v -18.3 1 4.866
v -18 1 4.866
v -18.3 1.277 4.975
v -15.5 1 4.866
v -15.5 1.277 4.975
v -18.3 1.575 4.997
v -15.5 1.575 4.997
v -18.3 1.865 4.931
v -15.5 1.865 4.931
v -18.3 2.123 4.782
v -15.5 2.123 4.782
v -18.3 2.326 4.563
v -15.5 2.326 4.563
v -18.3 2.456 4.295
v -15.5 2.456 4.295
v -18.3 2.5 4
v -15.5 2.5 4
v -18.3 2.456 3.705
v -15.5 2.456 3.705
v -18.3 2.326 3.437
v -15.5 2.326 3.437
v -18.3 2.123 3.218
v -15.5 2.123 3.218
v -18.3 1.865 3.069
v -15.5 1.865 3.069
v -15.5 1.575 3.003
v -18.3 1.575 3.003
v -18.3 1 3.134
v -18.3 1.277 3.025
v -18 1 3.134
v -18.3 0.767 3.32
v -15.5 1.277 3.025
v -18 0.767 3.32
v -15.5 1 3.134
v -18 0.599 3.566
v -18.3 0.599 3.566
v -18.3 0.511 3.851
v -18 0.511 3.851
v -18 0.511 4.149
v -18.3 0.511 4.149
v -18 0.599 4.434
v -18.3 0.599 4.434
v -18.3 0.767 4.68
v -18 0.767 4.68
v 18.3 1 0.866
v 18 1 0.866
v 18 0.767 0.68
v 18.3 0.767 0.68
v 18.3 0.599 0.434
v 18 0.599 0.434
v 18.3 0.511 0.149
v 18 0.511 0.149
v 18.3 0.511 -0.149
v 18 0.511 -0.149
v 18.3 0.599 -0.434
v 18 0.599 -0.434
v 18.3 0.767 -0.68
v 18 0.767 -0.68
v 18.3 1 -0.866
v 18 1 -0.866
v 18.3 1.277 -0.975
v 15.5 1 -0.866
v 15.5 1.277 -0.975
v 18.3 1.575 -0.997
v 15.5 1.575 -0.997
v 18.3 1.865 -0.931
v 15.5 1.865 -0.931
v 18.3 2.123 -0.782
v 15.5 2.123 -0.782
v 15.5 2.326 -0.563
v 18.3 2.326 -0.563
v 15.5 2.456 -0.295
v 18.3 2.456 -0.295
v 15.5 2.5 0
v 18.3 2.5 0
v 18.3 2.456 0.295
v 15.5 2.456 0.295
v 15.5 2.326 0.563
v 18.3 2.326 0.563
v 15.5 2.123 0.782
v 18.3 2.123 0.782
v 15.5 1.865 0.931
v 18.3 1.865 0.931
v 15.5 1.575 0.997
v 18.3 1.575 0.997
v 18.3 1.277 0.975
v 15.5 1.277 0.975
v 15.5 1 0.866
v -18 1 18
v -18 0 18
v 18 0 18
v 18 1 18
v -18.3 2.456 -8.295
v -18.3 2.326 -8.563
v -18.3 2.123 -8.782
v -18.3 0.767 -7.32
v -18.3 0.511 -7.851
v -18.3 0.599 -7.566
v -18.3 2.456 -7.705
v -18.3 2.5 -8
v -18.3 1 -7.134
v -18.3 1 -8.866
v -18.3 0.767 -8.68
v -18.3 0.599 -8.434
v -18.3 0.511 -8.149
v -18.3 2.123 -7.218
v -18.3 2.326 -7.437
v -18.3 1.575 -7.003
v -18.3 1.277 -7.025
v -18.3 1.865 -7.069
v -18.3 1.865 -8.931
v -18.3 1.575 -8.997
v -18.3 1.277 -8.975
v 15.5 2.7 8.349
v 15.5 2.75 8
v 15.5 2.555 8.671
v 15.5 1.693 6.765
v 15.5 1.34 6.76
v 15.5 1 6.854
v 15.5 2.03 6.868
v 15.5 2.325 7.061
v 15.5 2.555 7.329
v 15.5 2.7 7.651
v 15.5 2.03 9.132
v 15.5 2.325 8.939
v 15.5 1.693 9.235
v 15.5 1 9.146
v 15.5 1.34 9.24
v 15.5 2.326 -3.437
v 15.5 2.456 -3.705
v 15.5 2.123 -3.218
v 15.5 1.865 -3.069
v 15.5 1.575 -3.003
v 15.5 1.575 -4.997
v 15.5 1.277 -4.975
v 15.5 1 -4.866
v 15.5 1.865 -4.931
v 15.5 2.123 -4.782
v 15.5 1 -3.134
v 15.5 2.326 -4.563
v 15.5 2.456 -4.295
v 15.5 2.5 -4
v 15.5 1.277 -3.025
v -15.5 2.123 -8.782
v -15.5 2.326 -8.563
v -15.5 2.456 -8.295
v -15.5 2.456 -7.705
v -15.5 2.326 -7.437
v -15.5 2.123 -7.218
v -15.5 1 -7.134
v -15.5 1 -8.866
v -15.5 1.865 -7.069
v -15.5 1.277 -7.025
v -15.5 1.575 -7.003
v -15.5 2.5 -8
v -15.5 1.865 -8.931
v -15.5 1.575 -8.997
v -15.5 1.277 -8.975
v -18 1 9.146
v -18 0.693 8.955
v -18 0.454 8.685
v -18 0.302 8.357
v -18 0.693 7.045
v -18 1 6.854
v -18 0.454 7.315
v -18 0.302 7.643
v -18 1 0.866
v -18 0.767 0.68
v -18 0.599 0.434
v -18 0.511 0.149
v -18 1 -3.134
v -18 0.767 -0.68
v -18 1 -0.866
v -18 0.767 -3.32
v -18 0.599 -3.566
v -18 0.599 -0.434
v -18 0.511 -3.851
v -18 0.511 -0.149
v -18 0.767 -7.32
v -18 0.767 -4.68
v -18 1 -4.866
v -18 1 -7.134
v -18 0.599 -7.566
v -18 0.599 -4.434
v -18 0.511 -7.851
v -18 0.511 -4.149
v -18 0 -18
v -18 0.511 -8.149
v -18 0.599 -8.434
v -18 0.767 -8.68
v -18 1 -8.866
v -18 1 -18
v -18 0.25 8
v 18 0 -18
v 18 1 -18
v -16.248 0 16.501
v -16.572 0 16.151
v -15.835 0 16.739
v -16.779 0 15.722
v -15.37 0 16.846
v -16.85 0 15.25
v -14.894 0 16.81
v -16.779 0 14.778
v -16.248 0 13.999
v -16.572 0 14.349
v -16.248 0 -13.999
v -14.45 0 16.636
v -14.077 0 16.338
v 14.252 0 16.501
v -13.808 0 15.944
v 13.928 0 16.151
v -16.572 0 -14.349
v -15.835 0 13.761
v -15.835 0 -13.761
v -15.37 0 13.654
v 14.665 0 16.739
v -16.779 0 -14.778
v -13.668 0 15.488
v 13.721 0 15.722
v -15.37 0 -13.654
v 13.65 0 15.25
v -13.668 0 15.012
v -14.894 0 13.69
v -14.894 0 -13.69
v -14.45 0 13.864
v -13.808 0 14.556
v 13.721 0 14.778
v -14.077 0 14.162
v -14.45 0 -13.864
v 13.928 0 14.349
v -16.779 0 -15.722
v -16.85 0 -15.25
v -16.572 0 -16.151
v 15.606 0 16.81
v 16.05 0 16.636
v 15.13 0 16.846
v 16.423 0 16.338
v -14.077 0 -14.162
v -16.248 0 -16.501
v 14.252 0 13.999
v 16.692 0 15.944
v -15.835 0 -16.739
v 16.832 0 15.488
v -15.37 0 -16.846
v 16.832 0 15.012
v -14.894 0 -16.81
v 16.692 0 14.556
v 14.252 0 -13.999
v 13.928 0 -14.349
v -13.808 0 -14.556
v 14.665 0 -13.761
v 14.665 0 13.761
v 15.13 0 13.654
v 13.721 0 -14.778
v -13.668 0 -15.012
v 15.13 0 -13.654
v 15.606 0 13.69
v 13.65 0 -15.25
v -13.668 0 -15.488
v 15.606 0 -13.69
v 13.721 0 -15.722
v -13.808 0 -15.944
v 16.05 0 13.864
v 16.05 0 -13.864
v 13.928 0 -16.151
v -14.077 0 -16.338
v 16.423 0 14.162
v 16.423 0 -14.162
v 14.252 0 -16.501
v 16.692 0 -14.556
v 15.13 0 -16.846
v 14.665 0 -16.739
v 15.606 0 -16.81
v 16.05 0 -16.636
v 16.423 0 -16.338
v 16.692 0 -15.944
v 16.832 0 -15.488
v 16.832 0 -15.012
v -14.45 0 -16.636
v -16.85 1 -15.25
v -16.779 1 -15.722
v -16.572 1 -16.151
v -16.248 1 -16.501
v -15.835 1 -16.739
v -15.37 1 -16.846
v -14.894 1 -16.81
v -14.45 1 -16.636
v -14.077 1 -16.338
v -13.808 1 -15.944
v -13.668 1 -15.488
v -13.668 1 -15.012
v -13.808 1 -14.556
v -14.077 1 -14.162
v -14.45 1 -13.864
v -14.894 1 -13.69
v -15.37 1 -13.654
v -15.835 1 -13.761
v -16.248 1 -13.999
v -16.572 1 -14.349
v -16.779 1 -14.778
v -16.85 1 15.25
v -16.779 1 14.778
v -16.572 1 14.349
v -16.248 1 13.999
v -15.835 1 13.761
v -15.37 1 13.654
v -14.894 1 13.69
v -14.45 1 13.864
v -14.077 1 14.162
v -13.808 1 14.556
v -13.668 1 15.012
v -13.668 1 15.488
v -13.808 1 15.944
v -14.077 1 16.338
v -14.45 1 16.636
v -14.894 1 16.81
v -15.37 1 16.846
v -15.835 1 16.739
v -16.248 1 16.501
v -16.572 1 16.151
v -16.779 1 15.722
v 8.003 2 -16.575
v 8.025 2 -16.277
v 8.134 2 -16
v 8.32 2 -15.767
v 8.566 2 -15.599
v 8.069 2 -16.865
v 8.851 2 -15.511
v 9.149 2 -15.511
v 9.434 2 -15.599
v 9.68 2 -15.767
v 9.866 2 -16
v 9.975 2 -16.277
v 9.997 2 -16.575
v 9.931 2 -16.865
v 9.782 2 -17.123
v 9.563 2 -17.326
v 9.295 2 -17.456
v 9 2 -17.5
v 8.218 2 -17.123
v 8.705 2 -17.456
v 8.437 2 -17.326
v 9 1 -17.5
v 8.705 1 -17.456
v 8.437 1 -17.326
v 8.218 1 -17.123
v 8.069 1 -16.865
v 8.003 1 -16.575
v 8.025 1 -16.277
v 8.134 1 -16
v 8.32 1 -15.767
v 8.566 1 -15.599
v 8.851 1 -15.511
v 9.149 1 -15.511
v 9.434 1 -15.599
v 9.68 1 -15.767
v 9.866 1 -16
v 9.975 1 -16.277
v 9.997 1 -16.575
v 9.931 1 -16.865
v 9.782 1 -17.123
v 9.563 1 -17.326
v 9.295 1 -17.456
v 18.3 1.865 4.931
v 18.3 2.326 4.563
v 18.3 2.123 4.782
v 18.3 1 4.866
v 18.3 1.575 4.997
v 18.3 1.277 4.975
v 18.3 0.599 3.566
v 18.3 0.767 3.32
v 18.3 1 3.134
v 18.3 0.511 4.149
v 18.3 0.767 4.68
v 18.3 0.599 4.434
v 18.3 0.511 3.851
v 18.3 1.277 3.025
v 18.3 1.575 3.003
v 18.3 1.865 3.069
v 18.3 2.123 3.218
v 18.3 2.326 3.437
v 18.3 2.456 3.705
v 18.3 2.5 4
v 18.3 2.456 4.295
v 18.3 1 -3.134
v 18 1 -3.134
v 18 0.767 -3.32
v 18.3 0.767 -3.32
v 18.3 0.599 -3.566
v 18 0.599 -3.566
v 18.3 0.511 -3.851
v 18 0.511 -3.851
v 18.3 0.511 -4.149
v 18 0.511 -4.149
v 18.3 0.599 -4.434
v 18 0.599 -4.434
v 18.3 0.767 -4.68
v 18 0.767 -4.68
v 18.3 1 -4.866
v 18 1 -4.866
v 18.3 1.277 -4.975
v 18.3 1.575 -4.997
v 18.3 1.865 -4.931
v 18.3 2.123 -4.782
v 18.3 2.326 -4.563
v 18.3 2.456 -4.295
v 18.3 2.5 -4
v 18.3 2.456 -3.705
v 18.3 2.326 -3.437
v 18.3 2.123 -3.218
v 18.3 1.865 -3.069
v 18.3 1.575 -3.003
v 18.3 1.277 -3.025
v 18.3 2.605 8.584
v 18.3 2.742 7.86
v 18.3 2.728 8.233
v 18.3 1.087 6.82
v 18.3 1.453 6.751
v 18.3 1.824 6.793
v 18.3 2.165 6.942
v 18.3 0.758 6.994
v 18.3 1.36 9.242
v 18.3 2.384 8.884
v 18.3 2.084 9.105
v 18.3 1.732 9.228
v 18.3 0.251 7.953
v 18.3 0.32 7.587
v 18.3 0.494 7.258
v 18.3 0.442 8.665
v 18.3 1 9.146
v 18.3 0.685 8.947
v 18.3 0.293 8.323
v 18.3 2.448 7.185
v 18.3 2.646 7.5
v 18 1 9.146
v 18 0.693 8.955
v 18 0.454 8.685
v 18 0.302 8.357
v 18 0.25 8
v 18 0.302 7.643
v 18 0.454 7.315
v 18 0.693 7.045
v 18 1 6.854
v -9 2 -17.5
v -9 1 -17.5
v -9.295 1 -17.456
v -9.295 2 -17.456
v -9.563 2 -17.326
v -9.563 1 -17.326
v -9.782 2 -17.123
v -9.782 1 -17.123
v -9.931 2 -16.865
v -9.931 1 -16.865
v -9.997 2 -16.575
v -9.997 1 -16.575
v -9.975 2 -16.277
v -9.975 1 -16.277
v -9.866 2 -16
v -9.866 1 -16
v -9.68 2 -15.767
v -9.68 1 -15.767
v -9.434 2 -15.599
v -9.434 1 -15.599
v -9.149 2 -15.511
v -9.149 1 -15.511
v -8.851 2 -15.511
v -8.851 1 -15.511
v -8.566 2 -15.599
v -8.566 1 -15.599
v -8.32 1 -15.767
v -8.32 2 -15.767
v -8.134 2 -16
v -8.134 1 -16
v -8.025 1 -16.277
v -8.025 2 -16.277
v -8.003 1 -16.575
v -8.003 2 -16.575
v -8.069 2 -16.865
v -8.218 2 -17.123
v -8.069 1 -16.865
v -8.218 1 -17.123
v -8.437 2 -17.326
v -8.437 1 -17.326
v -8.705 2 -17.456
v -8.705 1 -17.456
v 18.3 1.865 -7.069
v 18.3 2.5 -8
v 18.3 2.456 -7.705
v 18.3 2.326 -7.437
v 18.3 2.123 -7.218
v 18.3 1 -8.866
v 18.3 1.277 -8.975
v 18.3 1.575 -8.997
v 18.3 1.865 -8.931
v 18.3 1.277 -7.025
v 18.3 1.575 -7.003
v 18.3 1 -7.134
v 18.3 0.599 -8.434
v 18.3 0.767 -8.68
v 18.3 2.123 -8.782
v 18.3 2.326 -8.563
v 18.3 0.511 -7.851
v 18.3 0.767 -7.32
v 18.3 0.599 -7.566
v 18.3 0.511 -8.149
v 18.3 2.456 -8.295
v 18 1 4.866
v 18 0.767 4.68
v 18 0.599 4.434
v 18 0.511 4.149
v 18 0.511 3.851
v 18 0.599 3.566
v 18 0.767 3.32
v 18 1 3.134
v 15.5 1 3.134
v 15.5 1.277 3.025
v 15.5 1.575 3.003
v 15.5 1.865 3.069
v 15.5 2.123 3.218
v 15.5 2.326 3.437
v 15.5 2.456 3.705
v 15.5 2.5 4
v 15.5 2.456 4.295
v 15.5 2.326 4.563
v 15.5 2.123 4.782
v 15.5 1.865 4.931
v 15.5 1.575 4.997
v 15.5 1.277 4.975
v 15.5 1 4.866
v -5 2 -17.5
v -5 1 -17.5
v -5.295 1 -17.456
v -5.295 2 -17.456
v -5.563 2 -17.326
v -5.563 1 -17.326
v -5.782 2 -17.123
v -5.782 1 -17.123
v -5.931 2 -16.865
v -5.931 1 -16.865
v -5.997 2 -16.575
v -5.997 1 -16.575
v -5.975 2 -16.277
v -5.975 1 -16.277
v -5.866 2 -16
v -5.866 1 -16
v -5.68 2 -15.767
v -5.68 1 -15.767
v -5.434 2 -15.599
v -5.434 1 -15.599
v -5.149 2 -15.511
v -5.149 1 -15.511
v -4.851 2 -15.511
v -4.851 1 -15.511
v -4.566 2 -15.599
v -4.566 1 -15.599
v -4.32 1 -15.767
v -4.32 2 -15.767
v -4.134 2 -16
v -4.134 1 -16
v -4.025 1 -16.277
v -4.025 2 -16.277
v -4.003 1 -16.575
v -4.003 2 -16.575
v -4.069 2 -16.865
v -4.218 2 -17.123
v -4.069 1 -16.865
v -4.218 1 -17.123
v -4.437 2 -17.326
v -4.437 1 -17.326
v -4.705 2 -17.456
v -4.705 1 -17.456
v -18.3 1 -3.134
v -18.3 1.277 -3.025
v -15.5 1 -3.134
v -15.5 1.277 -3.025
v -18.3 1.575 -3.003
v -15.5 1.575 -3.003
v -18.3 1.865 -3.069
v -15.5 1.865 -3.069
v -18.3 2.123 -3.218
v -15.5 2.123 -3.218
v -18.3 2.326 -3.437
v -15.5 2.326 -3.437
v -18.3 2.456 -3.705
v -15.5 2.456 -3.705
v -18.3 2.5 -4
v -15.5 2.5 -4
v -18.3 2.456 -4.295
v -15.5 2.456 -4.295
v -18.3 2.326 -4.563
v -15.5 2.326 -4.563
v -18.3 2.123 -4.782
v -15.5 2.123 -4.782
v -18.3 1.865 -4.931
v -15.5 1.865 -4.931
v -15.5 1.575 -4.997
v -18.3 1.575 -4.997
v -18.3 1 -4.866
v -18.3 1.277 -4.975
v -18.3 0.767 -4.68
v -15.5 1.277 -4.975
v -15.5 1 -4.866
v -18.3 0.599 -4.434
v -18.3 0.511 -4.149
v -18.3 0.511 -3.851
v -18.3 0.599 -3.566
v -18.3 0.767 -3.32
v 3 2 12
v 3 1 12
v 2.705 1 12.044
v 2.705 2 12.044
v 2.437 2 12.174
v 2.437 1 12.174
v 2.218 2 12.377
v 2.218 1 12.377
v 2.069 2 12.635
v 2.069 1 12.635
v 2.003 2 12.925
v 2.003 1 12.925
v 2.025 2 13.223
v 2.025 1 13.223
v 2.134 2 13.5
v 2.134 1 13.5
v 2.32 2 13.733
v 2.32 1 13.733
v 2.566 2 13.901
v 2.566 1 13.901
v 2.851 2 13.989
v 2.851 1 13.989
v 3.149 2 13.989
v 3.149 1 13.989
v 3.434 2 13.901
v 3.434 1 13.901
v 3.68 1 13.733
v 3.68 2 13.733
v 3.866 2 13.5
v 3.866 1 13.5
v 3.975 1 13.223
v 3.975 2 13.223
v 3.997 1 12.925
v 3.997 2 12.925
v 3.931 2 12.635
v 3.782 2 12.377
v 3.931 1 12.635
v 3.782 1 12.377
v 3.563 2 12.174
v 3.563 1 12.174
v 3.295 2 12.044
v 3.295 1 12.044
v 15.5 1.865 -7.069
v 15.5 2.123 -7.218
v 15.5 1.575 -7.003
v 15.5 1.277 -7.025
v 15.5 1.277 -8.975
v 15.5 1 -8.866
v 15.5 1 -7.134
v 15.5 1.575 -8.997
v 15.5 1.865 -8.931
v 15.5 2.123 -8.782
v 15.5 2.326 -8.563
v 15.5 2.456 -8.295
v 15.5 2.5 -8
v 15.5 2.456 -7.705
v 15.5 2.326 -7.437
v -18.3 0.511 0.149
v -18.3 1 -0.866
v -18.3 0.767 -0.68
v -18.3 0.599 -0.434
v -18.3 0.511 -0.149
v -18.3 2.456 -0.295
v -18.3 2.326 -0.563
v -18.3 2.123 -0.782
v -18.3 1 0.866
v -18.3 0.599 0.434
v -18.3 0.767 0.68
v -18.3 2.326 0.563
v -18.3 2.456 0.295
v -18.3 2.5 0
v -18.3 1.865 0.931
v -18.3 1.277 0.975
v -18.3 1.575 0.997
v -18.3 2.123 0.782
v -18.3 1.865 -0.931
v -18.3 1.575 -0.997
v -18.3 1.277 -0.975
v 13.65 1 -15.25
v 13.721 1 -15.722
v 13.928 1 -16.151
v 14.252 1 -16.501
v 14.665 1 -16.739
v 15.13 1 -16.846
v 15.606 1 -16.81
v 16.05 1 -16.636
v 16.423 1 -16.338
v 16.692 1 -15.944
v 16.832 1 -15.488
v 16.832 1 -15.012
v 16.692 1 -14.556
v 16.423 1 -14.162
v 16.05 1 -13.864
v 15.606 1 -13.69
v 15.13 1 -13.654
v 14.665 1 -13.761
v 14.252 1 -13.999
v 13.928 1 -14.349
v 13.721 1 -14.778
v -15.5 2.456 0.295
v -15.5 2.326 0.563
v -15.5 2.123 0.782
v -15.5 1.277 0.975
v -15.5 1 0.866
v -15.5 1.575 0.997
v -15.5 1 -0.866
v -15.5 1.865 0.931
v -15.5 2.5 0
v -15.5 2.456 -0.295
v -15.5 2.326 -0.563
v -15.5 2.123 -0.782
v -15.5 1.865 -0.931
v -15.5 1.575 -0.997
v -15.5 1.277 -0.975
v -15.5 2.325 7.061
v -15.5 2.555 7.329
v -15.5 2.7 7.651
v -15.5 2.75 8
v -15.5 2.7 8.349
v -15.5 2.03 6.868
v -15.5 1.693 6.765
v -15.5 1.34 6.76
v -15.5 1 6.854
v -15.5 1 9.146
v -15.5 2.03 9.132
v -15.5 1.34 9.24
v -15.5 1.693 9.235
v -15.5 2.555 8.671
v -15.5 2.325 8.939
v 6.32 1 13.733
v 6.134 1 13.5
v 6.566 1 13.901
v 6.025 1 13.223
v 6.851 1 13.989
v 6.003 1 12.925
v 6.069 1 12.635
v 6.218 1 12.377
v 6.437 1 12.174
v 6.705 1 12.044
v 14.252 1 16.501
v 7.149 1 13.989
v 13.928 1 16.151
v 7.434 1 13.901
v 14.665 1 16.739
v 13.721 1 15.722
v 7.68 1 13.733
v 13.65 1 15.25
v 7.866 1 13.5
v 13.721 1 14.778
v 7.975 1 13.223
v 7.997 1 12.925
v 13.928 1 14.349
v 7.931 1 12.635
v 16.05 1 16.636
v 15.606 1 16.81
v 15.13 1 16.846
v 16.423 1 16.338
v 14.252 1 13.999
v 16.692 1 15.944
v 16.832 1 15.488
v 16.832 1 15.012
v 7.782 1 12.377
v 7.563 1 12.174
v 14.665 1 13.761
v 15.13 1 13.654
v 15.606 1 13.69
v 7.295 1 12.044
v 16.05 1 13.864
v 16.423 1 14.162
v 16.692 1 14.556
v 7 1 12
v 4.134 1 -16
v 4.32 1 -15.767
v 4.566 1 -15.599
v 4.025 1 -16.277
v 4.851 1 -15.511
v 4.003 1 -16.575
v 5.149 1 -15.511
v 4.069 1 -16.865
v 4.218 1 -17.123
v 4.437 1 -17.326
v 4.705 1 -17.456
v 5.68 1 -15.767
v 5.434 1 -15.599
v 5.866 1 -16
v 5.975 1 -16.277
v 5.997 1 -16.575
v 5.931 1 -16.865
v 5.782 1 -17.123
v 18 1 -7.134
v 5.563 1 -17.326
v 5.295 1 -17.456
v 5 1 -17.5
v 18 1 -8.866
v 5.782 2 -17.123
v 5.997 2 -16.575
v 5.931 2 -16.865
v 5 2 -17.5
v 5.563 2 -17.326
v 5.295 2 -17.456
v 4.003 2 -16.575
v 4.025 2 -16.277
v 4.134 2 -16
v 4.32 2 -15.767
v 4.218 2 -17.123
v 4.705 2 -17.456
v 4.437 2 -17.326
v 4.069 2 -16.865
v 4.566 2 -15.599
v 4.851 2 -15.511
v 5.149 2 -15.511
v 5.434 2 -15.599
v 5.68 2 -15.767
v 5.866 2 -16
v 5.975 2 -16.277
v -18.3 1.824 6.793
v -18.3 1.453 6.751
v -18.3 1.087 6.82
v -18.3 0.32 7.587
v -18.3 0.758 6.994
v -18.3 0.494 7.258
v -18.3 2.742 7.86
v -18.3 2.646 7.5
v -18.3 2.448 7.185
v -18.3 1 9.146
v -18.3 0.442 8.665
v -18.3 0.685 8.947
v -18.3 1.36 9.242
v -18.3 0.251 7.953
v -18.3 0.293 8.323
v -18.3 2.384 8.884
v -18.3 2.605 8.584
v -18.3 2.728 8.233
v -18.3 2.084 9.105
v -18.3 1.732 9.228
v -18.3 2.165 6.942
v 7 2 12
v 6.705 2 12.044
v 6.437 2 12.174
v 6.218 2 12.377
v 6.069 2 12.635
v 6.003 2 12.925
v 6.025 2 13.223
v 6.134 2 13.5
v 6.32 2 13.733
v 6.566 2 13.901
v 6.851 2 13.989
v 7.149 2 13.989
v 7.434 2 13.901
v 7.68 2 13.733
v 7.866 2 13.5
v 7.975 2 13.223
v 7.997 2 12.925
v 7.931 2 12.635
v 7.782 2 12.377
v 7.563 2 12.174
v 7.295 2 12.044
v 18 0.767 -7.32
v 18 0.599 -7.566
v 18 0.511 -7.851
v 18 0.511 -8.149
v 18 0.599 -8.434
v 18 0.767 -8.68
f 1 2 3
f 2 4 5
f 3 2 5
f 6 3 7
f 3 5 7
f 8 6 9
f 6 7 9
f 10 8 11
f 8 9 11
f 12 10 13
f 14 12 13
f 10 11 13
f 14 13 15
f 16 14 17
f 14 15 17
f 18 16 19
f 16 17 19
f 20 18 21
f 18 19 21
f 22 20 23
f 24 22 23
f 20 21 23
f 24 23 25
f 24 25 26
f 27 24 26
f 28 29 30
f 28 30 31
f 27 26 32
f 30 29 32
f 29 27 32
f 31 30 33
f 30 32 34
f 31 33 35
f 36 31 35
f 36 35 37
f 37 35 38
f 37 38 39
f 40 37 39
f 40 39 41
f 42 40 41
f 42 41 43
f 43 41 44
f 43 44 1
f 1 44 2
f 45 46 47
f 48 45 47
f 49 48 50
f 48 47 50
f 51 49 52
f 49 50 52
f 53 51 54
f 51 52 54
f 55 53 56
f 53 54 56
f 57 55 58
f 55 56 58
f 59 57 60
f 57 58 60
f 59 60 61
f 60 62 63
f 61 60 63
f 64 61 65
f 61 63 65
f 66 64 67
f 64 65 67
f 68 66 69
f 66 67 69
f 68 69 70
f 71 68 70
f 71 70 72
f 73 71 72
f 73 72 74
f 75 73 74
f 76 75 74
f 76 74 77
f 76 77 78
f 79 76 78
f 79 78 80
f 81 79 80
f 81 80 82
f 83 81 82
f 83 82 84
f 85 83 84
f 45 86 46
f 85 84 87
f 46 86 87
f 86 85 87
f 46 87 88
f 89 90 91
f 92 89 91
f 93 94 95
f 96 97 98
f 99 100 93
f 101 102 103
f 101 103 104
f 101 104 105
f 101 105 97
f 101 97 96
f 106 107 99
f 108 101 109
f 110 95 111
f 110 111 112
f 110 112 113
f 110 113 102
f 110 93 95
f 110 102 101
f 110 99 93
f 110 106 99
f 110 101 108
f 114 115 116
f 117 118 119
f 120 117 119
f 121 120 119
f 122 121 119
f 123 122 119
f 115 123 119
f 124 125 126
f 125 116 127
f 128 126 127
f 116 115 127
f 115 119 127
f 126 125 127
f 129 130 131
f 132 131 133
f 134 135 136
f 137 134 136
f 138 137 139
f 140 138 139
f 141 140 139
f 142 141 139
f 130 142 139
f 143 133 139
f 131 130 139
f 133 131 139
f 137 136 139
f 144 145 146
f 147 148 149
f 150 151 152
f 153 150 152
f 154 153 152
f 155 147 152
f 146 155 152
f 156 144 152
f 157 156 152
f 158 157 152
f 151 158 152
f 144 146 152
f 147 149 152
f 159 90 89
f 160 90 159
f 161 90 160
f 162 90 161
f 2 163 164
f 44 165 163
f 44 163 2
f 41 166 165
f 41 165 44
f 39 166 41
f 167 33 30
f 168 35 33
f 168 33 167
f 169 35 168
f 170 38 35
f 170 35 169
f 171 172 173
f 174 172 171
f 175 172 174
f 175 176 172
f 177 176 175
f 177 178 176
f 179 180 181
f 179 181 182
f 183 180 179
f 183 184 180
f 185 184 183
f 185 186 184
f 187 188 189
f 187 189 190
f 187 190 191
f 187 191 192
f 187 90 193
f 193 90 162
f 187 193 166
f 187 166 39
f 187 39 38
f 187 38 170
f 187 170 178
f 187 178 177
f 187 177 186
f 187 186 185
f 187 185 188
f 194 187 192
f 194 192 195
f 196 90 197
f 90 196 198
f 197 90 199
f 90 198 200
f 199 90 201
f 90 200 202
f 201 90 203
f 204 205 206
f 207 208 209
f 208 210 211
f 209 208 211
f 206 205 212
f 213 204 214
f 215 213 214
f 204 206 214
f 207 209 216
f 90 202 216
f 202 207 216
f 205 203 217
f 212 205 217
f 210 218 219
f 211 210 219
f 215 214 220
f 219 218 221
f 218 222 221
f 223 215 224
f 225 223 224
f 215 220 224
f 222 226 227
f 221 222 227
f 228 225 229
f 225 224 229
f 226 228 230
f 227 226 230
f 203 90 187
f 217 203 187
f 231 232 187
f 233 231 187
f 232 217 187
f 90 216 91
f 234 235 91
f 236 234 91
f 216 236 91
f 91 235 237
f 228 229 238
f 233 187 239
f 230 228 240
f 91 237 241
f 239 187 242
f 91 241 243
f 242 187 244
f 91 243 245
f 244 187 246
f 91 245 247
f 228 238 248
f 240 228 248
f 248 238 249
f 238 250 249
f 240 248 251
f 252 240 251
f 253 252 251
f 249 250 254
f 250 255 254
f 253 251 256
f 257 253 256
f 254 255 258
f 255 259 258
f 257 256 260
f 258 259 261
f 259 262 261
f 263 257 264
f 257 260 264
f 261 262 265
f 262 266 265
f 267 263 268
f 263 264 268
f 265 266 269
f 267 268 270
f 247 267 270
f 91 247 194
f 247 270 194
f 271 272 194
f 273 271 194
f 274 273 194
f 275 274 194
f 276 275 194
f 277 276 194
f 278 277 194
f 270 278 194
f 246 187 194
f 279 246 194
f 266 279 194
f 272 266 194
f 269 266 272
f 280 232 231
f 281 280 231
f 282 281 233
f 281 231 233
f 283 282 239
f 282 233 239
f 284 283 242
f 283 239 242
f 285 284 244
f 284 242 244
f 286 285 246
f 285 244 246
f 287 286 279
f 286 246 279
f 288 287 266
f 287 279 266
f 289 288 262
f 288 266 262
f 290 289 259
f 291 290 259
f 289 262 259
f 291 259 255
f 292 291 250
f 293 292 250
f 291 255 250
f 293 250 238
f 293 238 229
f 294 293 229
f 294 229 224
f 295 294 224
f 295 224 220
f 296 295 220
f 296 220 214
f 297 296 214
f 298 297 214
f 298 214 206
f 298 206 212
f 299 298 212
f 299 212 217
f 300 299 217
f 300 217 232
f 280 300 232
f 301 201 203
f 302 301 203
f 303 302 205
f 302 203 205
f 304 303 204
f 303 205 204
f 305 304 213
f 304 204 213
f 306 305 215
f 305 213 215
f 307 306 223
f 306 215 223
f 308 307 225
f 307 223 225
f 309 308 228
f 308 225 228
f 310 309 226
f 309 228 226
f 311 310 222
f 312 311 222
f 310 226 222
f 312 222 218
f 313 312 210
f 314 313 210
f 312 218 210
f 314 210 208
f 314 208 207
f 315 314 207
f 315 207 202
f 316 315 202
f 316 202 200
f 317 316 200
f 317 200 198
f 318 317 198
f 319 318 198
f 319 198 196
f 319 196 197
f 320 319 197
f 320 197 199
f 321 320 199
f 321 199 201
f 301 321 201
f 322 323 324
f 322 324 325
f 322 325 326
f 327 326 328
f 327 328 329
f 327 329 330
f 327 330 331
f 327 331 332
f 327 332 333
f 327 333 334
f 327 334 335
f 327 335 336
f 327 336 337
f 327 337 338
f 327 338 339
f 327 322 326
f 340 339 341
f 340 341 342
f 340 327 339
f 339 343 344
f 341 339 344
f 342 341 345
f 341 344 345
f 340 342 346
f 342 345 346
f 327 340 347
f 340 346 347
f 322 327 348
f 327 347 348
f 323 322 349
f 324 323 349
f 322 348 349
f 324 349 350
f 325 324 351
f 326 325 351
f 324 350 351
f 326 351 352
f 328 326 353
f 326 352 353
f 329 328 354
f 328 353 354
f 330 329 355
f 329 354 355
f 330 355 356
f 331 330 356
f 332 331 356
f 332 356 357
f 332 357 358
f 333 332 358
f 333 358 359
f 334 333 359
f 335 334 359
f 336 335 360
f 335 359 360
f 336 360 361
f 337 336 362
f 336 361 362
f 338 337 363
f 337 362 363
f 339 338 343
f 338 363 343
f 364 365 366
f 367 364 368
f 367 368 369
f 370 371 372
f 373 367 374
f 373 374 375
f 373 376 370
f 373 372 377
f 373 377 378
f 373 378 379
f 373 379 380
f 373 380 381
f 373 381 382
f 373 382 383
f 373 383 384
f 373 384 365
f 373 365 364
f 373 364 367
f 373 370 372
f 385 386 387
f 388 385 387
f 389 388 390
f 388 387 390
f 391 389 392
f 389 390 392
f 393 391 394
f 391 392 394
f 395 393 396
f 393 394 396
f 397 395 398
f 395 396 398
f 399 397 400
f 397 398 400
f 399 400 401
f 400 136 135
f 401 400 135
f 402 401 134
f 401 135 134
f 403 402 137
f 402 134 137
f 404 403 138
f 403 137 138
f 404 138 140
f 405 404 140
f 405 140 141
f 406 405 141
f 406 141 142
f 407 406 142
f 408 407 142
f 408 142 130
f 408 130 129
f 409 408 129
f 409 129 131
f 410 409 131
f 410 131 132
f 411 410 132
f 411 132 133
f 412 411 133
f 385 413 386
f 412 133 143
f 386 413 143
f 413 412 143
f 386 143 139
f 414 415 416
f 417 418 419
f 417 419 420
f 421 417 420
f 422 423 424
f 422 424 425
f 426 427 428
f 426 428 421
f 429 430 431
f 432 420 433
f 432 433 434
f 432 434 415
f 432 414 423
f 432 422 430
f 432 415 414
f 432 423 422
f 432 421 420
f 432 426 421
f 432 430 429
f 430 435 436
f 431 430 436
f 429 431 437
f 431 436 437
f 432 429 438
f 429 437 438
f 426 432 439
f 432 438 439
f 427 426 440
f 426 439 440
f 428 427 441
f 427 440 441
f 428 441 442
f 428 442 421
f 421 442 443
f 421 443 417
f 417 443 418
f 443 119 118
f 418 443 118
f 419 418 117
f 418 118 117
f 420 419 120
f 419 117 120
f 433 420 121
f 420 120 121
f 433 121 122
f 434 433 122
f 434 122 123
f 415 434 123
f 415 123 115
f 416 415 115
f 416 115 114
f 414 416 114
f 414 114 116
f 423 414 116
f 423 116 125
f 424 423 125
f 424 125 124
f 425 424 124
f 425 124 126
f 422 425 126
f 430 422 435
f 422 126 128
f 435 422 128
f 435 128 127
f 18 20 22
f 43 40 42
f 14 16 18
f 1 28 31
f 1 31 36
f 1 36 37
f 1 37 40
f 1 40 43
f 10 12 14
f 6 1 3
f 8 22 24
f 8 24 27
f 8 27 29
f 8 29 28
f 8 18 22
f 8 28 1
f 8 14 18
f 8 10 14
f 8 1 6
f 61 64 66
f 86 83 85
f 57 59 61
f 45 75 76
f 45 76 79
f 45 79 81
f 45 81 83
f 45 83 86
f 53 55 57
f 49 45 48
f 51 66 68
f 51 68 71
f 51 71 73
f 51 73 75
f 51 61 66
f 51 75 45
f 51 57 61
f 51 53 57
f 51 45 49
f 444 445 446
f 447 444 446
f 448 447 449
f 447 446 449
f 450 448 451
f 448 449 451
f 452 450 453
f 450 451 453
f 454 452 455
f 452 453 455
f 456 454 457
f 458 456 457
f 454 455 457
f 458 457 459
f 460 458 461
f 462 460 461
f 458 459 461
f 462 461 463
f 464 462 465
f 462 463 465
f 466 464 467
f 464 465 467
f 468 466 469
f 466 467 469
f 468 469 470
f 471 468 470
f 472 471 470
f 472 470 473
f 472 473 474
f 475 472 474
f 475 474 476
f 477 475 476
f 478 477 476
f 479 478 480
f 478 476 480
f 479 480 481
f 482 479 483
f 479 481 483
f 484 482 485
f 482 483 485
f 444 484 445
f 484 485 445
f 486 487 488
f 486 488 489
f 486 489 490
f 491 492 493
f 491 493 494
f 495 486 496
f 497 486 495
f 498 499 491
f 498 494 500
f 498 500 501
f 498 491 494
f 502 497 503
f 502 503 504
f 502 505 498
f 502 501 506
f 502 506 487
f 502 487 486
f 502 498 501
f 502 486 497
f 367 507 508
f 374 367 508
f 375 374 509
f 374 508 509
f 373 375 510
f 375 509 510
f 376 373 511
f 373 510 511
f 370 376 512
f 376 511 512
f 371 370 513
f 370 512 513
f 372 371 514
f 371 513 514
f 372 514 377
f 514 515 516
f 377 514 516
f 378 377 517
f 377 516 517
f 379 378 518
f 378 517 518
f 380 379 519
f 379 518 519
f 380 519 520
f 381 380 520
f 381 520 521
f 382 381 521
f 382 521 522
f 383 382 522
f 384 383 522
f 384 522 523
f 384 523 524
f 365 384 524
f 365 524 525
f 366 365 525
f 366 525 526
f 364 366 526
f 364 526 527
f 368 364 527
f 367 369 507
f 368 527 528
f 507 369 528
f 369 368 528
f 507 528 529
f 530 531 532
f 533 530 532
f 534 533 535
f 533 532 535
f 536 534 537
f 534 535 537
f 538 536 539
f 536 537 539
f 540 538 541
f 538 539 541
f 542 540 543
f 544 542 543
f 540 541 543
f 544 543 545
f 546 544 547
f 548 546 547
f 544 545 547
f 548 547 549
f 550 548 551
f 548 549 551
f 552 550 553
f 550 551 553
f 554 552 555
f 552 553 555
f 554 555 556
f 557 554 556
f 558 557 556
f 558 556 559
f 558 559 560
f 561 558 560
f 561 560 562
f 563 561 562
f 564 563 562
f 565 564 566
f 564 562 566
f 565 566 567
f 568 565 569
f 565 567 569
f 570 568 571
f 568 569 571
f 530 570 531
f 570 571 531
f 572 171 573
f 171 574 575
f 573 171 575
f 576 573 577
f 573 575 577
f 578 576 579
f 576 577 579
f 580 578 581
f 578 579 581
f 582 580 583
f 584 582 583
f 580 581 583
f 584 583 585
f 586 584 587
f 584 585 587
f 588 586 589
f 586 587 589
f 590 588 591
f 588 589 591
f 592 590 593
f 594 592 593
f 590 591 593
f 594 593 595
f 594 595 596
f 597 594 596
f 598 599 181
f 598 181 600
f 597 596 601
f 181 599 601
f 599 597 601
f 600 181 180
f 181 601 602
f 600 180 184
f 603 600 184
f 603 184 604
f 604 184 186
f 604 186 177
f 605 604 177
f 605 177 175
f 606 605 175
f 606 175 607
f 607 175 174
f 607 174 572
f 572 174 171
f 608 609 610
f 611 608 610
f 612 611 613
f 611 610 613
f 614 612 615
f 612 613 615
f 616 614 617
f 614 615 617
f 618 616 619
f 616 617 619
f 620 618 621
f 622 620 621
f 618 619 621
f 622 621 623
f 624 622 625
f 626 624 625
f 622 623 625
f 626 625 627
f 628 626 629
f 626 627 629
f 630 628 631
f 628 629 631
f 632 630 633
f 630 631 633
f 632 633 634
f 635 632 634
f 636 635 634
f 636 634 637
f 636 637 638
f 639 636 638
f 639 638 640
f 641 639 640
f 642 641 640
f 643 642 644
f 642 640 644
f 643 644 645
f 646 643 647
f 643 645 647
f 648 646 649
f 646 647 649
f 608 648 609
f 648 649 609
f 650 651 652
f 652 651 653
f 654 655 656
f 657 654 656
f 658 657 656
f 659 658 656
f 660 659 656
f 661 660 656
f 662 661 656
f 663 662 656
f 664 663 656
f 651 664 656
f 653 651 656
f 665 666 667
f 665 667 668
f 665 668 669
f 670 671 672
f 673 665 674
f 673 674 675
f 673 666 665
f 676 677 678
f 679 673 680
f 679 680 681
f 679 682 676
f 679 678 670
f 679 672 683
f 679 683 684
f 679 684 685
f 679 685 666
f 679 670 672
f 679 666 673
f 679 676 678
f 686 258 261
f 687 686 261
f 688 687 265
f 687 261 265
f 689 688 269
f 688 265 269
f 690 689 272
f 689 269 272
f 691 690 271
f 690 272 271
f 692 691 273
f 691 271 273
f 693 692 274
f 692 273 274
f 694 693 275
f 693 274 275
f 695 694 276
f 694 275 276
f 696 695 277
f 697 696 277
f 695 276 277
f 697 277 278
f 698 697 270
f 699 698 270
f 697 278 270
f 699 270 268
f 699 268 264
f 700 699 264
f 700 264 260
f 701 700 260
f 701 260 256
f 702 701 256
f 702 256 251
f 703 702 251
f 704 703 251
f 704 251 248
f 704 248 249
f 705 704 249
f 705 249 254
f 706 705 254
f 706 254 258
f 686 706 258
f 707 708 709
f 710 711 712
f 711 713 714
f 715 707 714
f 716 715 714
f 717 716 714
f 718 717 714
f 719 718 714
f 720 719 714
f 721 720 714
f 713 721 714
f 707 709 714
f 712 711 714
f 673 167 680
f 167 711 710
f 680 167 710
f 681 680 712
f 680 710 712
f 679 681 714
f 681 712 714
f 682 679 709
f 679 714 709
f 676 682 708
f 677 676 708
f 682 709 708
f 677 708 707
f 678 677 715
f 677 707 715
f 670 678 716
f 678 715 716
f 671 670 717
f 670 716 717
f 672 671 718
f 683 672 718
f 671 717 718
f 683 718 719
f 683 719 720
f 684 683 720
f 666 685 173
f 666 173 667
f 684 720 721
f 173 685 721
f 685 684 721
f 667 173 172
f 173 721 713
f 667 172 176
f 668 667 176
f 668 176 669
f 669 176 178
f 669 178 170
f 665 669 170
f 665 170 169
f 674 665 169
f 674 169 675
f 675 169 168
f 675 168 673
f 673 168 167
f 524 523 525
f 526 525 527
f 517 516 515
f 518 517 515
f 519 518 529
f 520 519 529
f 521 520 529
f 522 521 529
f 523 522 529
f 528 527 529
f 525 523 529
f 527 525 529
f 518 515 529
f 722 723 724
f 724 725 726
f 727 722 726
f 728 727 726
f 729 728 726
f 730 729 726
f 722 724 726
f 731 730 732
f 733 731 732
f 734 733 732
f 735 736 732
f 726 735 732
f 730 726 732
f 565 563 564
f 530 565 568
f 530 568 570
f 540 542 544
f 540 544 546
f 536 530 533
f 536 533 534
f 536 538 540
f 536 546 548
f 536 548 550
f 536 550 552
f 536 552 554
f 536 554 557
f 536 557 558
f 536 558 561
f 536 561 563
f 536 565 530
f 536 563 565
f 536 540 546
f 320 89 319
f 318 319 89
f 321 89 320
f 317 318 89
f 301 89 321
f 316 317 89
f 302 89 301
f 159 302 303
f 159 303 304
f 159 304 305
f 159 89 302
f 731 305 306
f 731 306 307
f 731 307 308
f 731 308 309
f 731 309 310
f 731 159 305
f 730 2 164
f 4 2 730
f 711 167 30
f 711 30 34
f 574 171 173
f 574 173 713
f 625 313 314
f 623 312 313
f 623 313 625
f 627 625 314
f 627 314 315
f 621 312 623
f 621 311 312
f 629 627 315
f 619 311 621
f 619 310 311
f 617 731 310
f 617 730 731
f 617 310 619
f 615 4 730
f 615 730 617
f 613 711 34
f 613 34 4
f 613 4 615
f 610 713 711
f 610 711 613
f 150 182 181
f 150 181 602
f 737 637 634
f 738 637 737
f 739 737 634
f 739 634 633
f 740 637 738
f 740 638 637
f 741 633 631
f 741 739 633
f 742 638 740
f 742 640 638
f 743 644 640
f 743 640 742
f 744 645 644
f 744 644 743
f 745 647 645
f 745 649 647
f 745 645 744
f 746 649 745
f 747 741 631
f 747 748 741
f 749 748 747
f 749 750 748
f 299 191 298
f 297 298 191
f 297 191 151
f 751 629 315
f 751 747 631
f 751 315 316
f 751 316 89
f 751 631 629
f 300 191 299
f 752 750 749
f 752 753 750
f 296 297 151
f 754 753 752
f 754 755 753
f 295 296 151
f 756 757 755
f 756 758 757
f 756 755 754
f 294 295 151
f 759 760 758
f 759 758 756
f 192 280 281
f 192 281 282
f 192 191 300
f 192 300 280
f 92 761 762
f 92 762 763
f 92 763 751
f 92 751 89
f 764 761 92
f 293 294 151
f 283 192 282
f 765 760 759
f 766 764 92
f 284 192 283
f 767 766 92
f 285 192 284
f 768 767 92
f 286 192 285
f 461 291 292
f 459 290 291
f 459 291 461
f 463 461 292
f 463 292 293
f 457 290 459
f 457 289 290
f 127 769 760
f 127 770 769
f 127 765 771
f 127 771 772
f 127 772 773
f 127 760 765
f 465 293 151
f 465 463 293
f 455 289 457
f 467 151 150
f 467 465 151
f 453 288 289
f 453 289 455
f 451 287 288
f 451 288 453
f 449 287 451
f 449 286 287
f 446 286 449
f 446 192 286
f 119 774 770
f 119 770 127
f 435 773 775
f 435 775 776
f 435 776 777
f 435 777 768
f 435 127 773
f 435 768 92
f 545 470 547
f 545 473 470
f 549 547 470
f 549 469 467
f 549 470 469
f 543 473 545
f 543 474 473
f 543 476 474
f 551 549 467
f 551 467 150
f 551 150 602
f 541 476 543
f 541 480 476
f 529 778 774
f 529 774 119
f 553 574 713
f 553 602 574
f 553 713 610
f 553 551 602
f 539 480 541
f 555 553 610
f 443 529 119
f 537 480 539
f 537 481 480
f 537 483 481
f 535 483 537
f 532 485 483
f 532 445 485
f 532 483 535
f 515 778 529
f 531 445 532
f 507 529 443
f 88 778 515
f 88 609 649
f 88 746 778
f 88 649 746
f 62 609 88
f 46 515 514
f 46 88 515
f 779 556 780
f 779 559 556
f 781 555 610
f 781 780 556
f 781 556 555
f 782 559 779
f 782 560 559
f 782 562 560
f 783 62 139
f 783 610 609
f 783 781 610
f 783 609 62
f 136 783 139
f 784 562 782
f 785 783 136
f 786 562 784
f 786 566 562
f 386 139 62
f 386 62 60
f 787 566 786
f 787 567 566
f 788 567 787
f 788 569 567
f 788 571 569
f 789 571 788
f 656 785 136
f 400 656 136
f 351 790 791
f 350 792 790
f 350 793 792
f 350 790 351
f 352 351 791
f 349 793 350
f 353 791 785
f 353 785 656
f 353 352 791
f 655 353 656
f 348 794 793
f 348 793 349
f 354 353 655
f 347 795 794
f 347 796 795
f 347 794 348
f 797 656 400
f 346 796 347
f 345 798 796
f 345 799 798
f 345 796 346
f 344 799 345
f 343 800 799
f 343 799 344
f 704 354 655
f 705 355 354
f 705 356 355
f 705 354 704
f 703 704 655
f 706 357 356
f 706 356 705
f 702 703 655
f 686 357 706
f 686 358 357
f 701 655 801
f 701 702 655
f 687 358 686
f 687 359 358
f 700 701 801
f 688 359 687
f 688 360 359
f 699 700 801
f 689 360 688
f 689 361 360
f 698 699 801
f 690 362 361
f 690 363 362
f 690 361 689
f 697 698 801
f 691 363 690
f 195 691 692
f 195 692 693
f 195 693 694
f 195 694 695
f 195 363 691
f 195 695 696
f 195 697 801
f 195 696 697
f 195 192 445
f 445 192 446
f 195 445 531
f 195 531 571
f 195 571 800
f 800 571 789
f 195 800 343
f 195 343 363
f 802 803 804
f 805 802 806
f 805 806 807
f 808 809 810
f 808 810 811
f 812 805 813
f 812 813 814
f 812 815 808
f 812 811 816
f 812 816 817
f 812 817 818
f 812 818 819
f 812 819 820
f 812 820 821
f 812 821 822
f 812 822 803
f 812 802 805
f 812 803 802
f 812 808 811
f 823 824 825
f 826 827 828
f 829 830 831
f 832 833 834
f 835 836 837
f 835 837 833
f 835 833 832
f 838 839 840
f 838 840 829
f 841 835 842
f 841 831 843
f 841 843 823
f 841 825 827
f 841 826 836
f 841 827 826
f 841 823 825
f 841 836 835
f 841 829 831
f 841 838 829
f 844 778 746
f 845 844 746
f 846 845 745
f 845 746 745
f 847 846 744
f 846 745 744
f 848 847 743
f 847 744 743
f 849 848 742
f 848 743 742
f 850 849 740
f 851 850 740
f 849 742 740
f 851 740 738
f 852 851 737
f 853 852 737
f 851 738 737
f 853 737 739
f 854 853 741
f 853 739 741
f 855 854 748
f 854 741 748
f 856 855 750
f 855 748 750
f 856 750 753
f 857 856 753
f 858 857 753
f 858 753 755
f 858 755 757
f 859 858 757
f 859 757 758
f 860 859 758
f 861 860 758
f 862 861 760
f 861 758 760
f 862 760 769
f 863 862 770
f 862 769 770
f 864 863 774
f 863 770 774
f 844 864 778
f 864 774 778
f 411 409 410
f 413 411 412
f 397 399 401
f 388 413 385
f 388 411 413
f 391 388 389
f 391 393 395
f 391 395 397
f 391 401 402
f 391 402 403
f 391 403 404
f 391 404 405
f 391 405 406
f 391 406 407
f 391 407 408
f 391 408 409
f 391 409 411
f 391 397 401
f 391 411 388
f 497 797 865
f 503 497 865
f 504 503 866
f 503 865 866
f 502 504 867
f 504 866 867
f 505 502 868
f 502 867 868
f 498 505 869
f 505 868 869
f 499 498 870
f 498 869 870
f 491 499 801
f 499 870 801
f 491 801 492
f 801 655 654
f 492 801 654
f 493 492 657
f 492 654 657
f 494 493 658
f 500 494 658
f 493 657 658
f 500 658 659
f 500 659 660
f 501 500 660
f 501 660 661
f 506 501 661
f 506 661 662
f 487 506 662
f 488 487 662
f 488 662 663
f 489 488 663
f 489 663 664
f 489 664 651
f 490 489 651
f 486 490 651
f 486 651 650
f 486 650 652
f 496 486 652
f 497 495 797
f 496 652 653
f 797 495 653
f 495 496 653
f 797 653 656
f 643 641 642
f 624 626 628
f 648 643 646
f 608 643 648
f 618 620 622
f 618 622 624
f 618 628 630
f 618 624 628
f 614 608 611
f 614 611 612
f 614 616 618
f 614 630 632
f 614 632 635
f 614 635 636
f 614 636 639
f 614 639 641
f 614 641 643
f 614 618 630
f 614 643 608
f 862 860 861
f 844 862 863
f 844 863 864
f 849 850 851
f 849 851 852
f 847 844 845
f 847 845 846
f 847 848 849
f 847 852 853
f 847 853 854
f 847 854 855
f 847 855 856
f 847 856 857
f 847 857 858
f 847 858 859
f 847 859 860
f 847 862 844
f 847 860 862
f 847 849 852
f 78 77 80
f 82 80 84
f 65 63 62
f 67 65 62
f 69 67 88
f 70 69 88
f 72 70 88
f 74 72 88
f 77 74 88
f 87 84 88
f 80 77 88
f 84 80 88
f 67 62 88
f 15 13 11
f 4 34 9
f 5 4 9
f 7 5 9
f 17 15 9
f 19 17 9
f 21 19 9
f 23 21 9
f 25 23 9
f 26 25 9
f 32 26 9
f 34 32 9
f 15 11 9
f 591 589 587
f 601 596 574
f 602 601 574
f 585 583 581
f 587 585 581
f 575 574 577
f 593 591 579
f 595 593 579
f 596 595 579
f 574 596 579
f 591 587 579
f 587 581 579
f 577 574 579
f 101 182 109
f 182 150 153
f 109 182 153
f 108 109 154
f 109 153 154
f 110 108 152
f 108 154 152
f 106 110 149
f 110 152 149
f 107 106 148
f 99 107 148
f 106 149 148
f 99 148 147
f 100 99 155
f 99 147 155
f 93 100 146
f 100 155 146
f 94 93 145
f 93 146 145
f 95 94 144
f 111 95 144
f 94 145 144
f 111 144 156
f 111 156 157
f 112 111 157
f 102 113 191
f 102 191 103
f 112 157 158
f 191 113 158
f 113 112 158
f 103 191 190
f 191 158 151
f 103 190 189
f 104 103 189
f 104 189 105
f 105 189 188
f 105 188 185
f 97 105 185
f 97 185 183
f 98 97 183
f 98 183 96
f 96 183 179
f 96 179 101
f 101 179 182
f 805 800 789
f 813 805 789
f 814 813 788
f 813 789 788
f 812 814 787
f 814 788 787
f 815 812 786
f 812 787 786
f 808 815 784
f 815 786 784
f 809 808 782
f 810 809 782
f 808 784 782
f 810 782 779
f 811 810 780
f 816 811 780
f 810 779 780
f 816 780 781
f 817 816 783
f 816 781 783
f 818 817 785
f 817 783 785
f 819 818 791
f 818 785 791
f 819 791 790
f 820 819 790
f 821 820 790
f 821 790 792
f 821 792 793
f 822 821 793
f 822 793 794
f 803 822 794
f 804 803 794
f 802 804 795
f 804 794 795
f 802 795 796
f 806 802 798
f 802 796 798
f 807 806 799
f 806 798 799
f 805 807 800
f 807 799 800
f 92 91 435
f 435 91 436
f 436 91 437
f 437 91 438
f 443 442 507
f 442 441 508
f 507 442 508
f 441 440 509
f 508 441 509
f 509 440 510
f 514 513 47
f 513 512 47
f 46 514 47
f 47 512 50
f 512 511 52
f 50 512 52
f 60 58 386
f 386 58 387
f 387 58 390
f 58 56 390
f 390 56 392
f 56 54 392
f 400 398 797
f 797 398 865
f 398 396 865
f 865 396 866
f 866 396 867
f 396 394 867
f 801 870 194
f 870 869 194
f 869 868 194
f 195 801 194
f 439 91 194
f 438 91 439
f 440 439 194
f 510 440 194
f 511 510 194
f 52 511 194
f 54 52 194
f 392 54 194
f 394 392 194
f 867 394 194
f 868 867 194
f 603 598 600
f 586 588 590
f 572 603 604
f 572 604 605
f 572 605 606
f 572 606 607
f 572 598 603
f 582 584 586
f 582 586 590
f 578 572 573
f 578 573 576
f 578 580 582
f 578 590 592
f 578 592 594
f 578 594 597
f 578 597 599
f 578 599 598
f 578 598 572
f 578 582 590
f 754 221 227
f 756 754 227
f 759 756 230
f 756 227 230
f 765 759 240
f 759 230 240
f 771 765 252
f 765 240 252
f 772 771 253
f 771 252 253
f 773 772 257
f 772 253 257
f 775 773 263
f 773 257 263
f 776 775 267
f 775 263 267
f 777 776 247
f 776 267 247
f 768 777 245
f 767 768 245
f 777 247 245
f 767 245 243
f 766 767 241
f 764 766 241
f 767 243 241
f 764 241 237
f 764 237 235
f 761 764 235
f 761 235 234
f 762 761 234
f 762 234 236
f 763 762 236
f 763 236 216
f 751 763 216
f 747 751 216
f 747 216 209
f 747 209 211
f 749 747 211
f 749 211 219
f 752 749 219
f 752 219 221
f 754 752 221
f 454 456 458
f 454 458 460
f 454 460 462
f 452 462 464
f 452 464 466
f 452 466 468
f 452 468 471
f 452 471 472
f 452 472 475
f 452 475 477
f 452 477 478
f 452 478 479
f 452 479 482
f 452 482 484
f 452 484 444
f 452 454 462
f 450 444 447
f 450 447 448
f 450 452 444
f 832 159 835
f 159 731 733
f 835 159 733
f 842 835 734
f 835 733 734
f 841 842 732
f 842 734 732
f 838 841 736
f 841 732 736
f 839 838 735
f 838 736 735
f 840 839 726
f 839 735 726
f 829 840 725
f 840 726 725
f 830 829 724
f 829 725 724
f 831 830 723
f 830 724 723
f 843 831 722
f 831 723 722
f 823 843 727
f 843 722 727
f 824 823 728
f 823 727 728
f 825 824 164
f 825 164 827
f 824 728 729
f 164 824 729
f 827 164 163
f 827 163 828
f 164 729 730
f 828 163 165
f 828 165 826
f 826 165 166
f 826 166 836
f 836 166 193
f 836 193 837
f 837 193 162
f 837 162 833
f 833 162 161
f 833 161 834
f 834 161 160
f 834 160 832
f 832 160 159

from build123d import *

# Parameters (mm, degrees)
SKIZZE1_W                        = 36
SKIZZE1_H                        = 36
PLATINE_DEPTH                    = 1
F_3_2_3_2_DURCHMESSER_BOHRUNG1_D = 3.2
ANSCHLUESSE_MINUS_DEPTH          = 0.3
ANSCHLUESSE_MINUS_DEPTH_BACK     = 2.5
SKIZZE5_R                        = 1.25
SKIZZE5_R_2                      = 1
ANSCHLUESSE_PLUS_DEPTH           = 0.3
ANSCHLUESSE_PLUS_DEPTH_BACK      = 2.5
SKIZZE6_R                        = 1
SKIZZE6_R_2                      = 1.25
SKIZZE7_R                        = 1
SKUND_RANSCHL_SSE_DEPTH          = 1


with BuildPart() as part:
    # Skizze1 → Platine (new body)
    with BuildSketch(Plane(origin=(0, 0, 0), x_dir=(1, 0, 0), z_dir=(0, 1, 0))):
        Rectangle(SKIZZE1_W, SKIZZE1_H)
    extrude(amount=PLATINE_DEPTH)

    # Ø3.2 (3.2) Durchmesser Bohrung1 (through all)
    with Locations(Plane(origin=(0, 1, 0), x_dir=(1, 0, 0), z_dir=(0, 1, 0))):
        with Locations((-15.25, 15.25), (15.25, 15.25), (15.25, -15.25), (-15.25, -15.25)):
            Hole(F_3_2_3_2_DURCHMESSER_BOHRUNG1_D / 2)

    # Skizze5 → Anschluesse_Minus (add, two sides: drawn at the far end of the back side and taken through both)
    with BuildSketch(Plane(origin=(18, 0, 0), x_dir=(0, 0, -1), z_dir=(1, 0, 0)).offset(-ANSCHLUESSE_MINUS_DEPTH_BACK)):
        with Locations((-8, 1.5)):
            Circle(SKIZZE5_R)
        with Locations((-4, 1.5)):
            Circle(SKIZZE5_R_2)
        with Locations((0, 1.5)):
            Circle(SKIZZE5_R_2)
        with Locations((4, 1.5)):
            Circle(SKIZZE5_R_2)
        with Locations((8, 1.5)):
            Circle(SKIZZE5_R_2)
    extrude(amount=ANSCHLUESSE_MINUS_DEPTH + ANSCHLUESSE_MINUS_DEPTH_BACK)

    # Skizze6 → Anschluesse_Plus (add, two sides: drawn at the far end of the back side and taken through both)
    with BuildSketch(Plane.ZY.offset(18).offset(-ANSCHLUESSE_PLUS_DEPTH_BACK)):
        with Locations((-8, 1.5)):
            Circle(SKIZZE6_R)
        with Locations((-4, 1.5)):
            Circle(SKIZZE6_R)
        with Locations((0, 1.5)):
            Circle(SKIZZE6_R)
        with Locations((4, 1.5)):
            Circle(SKIZZE6_R)
        with Locations((8, 1.5)):
            Circle(SKIZZE6_R_2)
    extrude(amount=ANSCHLUESSE_PLUS_DEPTH + ANSCHLUESSE_PLUS_DEPTH_BACK)

    # Skizze7 → Skundäranschlüsse (add)
    with BuildSketch(Plane(origin=(0, 1, 0), x_dir=(1, 0, 0), z_dir=(0, 1, 0))):
        with Locations((-9, 16.5)):
            Circle(SKIZZE7_R)
        with Locations((-5, 16.5)):
            Circle(SKIZZE7_R)
        with Locations((5, 16.5)):
            Circle(SKIZZE7_R)
        with Locations((9, 16.5)):
            Circle(SKIZZE7_R)
        with Locations((3, -13)):
            Circle(SKIZZE7_R)
        with Locations((7, -13)):
            Circle(SKIZZE7_R)
    extrude(amount=SKUND_RANSCHL_SSE_DEPTH)


solid = part.part
